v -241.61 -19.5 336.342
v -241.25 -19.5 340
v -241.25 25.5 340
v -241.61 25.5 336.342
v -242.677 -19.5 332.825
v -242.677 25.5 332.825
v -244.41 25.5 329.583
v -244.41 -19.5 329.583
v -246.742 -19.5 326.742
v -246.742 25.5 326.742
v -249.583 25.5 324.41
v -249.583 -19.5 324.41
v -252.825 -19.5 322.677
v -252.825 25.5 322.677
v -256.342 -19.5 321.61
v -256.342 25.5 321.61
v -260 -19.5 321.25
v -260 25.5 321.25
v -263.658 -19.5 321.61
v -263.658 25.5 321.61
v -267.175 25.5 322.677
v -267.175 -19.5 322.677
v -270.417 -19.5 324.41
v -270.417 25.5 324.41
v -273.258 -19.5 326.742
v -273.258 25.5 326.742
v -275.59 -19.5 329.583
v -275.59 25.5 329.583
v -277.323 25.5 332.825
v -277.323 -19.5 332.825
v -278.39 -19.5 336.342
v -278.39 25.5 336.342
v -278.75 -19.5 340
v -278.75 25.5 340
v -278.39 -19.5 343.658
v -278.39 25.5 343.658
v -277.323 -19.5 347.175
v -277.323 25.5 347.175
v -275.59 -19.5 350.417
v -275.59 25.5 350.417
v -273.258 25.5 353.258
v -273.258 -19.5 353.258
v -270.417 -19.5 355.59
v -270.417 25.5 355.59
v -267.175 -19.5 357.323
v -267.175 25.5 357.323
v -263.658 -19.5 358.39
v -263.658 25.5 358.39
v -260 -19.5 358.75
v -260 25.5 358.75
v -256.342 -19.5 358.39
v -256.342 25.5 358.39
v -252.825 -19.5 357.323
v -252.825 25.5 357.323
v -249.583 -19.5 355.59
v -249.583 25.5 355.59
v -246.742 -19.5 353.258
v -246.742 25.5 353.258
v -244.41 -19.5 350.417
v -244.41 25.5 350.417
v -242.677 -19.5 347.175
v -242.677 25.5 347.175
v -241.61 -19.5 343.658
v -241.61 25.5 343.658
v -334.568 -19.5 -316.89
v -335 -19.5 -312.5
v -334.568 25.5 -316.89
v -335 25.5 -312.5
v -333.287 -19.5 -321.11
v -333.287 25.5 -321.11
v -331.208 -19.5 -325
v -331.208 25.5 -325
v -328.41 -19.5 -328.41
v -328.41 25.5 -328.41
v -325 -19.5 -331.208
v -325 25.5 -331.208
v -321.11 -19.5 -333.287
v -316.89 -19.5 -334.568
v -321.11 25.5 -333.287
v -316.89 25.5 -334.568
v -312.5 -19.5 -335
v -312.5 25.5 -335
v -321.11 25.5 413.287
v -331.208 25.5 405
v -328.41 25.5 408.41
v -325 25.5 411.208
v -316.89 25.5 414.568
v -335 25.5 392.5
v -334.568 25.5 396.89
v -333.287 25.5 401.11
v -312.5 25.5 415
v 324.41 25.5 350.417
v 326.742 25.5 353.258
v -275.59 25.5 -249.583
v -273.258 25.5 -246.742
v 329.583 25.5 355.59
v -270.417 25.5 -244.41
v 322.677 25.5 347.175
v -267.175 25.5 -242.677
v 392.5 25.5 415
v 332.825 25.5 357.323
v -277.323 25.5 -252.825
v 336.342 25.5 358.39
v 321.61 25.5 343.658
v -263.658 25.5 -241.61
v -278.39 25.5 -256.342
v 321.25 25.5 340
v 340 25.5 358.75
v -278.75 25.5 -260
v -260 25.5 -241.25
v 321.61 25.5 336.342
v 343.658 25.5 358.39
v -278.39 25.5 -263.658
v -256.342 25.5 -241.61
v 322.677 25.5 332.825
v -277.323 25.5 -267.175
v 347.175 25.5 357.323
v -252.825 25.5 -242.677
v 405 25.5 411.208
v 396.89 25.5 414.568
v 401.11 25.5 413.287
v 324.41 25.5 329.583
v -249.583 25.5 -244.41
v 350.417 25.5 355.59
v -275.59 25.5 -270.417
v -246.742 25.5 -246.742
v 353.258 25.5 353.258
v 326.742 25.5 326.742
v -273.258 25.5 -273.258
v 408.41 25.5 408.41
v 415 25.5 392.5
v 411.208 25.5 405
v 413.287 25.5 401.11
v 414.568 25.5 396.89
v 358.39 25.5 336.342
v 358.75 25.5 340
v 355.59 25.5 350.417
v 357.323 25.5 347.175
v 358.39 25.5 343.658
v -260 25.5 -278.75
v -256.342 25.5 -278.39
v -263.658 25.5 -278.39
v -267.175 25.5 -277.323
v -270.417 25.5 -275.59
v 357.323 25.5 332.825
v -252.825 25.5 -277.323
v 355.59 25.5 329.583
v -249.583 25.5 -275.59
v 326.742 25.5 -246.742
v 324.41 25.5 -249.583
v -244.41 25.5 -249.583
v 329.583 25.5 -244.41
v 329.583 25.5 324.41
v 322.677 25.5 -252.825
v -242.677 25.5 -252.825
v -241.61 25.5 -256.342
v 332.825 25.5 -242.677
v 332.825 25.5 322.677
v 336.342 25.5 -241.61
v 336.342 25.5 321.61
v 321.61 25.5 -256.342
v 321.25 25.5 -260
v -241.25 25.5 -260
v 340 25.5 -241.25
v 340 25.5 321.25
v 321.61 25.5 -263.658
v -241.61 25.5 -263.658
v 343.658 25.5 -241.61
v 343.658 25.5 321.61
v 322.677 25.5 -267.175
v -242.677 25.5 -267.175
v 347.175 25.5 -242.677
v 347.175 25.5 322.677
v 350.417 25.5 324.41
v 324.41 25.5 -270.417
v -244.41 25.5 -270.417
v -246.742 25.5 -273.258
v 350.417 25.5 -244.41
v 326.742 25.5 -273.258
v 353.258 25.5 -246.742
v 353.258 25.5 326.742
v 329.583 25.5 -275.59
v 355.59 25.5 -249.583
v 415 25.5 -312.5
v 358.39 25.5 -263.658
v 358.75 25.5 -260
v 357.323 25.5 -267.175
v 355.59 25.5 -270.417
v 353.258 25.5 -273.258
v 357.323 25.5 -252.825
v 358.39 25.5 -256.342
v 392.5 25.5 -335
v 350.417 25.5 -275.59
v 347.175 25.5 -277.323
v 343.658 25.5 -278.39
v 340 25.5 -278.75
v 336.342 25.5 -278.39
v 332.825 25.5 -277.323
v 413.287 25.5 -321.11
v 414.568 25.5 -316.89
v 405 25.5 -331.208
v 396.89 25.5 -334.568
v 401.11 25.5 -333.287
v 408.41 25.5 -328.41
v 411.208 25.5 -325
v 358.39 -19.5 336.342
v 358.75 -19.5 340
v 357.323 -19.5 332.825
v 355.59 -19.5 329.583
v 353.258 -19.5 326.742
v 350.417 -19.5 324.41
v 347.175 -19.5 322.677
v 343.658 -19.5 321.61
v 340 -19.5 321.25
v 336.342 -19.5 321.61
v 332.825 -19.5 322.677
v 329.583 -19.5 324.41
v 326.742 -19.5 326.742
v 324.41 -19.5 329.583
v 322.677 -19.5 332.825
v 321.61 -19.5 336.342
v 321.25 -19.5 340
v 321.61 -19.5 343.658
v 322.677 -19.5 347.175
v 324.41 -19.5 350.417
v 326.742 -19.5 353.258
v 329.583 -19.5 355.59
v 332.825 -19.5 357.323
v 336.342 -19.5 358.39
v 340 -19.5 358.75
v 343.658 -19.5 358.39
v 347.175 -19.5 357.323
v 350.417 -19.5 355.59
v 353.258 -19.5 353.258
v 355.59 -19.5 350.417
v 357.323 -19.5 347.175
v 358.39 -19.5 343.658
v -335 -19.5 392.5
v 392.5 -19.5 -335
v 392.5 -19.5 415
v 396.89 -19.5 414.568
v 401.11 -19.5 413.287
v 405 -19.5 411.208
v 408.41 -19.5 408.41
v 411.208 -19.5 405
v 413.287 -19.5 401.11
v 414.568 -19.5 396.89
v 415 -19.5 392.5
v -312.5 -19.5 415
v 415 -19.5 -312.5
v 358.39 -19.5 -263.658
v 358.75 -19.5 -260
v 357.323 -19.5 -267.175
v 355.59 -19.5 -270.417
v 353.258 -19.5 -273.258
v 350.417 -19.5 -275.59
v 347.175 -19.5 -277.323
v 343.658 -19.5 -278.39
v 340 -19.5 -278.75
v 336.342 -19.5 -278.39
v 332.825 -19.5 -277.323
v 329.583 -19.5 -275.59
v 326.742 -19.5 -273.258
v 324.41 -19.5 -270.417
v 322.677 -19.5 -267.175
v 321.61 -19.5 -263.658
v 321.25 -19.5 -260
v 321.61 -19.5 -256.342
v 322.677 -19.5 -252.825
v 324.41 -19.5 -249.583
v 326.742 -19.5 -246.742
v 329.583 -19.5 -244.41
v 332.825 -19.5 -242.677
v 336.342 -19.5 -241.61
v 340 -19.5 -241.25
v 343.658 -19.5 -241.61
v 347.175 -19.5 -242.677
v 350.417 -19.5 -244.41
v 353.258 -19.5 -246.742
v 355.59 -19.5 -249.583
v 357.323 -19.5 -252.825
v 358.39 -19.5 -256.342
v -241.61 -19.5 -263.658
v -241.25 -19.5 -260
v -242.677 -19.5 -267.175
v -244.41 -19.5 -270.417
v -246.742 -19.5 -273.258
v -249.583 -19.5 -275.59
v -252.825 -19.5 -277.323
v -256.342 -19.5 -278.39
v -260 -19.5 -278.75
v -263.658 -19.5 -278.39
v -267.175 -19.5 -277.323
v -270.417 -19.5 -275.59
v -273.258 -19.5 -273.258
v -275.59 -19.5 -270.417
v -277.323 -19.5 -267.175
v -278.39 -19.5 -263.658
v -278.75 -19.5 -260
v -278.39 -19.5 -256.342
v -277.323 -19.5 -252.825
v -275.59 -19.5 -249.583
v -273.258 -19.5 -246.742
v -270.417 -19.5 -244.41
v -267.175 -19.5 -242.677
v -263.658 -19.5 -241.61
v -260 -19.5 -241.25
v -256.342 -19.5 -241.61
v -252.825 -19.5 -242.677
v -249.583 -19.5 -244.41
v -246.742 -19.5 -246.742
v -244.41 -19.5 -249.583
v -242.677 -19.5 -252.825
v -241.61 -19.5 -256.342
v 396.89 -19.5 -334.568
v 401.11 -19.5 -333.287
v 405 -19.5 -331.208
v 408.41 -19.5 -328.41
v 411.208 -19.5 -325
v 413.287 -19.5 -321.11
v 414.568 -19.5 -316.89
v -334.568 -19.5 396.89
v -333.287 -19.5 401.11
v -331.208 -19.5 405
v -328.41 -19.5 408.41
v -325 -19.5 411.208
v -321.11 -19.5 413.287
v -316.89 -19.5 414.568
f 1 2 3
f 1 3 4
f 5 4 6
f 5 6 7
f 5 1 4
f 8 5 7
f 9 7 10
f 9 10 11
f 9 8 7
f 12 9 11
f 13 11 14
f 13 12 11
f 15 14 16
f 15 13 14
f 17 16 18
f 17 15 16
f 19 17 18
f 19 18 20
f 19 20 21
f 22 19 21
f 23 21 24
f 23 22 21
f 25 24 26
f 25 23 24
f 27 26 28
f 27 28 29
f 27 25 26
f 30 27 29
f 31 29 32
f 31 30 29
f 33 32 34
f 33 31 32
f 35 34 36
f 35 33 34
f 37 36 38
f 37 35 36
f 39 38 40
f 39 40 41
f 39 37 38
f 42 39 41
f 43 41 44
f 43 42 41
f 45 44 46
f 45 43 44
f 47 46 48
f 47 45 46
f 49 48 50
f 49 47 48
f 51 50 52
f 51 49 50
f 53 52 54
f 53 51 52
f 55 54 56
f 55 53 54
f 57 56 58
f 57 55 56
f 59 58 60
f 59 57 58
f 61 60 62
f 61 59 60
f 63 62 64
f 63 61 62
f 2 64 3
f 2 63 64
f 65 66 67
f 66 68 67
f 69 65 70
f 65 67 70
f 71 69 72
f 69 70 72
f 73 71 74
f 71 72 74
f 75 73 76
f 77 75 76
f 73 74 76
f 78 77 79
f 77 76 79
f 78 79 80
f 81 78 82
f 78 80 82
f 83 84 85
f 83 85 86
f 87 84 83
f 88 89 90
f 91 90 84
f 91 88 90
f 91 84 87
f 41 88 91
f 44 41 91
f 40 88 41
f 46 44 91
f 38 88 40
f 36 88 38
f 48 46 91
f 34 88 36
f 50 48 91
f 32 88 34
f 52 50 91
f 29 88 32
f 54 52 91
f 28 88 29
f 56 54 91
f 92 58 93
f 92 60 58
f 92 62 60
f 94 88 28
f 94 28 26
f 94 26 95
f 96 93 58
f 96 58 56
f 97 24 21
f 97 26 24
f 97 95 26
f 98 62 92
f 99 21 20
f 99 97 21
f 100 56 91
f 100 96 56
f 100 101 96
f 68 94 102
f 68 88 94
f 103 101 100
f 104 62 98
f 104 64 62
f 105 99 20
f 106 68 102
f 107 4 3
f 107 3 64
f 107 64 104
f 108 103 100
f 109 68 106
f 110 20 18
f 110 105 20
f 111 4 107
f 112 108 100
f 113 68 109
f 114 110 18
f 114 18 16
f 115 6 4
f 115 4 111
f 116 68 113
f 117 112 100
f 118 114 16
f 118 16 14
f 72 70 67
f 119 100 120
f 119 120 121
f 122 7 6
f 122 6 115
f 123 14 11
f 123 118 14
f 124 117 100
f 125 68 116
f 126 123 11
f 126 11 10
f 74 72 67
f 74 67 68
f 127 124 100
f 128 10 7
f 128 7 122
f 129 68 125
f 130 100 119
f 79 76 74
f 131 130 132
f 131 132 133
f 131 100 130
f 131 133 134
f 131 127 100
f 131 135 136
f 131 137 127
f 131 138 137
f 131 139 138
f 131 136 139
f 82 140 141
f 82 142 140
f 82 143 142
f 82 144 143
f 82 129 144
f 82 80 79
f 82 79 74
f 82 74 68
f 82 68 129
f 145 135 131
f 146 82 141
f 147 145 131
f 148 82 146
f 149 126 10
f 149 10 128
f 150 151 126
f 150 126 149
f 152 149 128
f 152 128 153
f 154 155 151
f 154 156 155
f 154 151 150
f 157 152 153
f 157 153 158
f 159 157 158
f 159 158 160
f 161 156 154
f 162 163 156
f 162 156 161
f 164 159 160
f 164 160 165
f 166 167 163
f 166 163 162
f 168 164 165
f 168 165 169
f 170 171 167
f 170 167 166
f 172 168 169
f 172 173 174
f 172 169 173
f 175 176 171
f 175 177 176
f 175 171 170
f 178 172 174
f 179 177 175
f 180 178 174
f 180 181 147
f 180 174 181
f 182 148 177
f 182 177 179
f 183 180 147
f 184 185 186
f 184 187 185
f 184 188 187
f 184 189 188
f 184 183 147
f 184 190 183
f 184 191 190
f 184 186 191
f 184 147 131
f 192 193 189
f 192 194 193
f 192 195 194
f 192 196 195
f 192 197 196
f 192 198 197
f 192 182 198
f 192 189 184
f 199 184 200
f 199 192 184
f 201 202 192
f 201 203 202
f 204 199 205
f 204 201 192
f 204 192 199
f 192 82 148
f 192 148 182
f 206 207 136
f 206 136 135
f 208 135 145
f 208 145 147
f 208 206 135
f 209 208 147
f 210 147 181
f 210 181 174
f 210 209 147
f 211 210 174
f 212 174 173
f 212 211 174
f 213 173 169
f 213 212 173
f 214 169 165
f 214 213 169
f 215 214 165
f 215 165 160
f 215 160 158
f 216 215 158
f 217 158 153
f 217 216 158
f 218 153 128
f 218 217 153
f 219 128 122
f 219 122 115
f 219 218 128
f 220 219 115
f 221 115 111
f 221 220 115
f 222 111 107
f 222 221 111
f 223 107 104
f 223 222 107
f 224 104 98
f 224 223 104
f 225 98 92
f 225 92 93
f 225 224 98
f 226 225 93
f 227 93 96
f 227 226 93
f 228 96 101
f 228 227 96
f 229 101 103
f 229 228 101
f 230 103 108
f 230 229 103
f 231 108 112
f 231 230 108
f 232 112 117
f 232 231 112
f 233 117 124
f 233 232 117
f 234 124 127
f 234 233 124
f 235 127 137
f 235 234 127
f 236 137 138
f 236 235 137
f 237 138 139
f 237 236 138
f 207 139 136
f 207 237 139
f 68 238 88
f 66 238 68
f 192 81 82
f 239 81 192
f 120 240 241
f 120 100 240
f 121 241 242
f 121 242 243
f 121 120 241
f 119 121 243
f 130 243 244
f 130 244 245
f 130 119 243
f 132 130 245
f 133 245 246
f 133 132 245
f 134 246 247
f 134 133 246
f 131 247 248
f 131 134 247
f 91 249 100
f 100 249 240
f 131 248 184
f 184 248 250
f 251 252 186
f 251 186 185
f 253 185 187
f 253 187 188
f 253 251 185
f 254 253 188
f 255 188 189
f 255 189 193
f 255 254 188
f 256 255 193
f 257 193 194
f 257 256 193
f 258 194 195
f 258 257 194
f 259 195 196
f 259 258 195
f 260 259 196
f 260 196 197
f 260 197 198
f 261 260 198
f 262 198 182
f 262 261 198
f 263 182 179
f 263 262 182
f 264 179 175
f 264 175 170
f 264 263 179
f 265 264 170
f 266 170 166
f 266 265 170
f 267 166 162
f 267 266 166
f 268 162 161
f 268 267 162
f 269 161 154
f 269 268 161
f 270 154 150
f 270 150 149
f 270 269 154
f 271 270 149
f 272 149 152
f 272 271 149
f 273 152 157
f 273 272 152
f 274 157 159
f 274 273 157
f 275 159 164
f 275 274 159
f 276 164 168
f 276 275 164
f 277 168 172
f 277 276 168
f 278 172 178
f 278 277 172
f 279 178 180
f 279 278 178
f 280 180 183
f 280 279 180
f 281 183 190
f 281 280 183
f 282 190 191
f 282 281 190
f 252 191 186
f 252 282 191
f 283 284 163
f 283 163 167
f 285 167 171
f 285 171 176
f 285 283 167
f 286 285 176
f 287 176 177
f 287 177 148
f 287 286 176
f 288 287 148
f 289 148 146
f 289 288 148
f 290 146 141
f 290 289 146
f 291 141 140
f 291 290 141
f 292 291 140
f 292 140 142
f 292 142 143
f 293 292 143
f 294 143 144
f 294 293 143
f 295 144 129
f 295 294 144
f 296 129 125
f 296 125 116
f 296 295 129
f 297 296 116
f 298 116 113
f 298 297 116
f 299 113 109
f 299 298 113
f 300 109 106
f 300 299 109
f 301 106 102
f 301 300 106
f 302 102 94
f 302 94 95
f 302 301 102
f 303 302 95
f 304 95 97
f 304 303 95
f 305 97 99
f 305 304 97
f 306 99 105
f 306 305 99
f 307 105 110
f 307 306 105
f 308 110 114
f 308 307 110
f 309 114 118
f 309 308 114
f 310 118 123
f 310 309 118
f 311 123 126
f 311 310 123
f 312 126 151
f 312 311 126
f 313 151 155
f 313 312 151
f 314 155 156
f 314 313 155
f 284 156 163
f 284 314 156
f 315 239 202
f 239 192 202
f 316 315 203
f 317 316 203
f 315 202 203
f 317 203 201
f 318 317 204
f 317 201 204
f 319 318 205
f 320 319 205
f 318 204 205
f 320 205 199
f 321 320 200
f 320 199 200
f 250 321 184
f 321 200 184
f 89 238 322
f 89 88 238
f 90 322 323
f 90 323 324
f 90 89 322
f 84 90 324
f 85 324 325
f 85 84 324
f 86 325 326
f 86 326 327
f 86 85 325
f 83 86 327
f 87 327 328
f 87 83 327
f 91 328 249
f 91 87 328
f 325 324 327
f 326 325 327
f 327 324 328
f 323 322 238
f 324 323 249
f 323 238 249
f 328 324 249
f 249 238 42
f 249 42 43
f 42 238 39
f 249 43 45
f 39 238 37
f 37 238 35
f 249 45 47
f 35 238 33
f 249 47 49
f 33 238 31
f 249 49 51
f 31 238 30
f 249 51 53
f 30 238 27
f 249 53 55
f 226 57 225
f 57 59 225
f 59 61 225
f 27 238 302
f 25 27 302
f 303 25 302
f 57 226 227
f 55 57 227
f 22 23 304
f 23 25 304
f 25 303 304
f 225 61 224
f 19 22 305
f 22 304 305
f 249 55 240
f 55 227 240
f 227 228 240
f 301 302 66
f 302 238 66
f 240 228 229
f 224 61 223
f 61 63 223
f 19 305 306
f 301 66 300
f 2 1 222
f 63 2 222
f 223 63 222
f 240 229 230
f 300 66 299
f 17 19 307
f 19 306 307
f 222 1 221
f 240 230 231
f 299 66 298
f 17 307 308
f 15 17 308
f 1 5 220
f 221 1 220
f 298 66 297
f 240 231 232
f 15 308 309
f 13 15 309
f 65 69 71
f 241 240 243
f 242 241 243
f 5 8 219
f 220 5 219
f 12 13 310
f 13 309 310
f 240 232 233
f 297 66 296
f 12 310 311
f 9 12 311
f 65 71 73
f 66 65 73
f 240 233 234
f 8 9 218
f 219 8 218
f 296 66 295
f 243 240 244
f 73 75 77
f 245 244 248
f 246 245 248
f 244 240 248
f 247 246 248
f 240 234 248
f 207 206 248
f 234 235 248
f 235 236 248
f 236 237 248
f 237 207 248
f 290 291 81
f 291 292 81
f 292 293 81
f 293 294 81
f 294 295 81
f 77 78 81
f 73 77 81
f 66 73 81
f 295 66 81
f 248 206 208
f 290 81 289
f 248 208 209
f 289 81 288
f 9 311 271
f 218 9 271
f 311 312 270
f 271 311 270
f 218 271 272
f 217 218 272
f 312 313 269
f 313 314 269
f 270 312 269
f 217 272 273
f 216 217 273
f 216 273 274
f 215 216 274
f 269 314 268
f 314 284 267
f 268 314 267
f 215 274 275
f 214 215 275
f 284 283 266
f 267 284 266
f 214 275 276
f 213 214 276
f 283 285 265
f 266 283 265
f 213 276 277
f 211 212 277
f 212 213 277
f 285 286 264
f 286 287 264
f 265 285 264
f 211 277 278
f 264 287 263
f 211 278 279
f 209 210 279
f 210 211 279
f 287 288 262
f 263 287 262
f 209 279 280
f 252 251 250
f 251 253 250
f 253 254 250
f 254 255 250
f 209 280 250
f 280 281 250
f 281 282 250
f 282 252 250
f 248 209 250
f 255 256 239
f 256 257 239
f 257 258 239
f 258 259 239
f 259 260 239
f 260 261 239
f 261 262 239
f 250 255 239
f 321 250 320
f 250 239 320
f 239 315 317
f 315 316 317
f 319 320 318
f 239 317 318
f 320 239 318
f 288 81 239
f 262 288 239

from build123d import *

# Parameters (mm, degrees)
SKETCH1_W           = 100
SKETCH1_H           = 100
SKETCH1_R           = 2.5
BOSS_EXTRUDE1_DEPTH = 6
FILLET1_R           = 3
SCALE1_SCALE        = 7.5


with BuildPart() as part:
    # Sketch1 → Boss-Extrude1 (new body)
    with BuildSketch(Plane(origin=(0, 0, 0), x_dir=(1, 0, 0), z_dir=(0, 1, 0))):
        with Locations((40, -40)):
            Rectangle(SKETCH1_W, SKETCH1_H)
        Circle(SKETCH1_R, mode=Mode.SUBTRACT)
        with Locations((80, 0)):
            Circle(SKETCH1_R, mode=Mode.SUBTRACT)
        with Locations((80, -80)):
            Circle(SKETCH1_R, mode=Mode.SUBTRACT)
        with Locations((0, -80)):
            Circle(SKETCH1_R, mode=Mode.SUBTRACT)
    extrude(amount=BOSS_EXTRUDE1_DEPTH)

    # Fillet1
    fillet1_edges = [part.edges().sort_by_distance(p)[0] for p in [
        (-10, 3, -10),
        (90, 3, -10),
        (90, 3, 90),
        (-10, 3, 90),
    ]]
    fillet(fillet1_edges, radius=FILLET1_R)


with BuildPart() as part_1:
    # Scale1: scaled about (40, 3, 40)
    add(part.part.scale(SCALE1_SCALE).moved(Location((-260, -19.5, -260))))


solid = part_1.part
